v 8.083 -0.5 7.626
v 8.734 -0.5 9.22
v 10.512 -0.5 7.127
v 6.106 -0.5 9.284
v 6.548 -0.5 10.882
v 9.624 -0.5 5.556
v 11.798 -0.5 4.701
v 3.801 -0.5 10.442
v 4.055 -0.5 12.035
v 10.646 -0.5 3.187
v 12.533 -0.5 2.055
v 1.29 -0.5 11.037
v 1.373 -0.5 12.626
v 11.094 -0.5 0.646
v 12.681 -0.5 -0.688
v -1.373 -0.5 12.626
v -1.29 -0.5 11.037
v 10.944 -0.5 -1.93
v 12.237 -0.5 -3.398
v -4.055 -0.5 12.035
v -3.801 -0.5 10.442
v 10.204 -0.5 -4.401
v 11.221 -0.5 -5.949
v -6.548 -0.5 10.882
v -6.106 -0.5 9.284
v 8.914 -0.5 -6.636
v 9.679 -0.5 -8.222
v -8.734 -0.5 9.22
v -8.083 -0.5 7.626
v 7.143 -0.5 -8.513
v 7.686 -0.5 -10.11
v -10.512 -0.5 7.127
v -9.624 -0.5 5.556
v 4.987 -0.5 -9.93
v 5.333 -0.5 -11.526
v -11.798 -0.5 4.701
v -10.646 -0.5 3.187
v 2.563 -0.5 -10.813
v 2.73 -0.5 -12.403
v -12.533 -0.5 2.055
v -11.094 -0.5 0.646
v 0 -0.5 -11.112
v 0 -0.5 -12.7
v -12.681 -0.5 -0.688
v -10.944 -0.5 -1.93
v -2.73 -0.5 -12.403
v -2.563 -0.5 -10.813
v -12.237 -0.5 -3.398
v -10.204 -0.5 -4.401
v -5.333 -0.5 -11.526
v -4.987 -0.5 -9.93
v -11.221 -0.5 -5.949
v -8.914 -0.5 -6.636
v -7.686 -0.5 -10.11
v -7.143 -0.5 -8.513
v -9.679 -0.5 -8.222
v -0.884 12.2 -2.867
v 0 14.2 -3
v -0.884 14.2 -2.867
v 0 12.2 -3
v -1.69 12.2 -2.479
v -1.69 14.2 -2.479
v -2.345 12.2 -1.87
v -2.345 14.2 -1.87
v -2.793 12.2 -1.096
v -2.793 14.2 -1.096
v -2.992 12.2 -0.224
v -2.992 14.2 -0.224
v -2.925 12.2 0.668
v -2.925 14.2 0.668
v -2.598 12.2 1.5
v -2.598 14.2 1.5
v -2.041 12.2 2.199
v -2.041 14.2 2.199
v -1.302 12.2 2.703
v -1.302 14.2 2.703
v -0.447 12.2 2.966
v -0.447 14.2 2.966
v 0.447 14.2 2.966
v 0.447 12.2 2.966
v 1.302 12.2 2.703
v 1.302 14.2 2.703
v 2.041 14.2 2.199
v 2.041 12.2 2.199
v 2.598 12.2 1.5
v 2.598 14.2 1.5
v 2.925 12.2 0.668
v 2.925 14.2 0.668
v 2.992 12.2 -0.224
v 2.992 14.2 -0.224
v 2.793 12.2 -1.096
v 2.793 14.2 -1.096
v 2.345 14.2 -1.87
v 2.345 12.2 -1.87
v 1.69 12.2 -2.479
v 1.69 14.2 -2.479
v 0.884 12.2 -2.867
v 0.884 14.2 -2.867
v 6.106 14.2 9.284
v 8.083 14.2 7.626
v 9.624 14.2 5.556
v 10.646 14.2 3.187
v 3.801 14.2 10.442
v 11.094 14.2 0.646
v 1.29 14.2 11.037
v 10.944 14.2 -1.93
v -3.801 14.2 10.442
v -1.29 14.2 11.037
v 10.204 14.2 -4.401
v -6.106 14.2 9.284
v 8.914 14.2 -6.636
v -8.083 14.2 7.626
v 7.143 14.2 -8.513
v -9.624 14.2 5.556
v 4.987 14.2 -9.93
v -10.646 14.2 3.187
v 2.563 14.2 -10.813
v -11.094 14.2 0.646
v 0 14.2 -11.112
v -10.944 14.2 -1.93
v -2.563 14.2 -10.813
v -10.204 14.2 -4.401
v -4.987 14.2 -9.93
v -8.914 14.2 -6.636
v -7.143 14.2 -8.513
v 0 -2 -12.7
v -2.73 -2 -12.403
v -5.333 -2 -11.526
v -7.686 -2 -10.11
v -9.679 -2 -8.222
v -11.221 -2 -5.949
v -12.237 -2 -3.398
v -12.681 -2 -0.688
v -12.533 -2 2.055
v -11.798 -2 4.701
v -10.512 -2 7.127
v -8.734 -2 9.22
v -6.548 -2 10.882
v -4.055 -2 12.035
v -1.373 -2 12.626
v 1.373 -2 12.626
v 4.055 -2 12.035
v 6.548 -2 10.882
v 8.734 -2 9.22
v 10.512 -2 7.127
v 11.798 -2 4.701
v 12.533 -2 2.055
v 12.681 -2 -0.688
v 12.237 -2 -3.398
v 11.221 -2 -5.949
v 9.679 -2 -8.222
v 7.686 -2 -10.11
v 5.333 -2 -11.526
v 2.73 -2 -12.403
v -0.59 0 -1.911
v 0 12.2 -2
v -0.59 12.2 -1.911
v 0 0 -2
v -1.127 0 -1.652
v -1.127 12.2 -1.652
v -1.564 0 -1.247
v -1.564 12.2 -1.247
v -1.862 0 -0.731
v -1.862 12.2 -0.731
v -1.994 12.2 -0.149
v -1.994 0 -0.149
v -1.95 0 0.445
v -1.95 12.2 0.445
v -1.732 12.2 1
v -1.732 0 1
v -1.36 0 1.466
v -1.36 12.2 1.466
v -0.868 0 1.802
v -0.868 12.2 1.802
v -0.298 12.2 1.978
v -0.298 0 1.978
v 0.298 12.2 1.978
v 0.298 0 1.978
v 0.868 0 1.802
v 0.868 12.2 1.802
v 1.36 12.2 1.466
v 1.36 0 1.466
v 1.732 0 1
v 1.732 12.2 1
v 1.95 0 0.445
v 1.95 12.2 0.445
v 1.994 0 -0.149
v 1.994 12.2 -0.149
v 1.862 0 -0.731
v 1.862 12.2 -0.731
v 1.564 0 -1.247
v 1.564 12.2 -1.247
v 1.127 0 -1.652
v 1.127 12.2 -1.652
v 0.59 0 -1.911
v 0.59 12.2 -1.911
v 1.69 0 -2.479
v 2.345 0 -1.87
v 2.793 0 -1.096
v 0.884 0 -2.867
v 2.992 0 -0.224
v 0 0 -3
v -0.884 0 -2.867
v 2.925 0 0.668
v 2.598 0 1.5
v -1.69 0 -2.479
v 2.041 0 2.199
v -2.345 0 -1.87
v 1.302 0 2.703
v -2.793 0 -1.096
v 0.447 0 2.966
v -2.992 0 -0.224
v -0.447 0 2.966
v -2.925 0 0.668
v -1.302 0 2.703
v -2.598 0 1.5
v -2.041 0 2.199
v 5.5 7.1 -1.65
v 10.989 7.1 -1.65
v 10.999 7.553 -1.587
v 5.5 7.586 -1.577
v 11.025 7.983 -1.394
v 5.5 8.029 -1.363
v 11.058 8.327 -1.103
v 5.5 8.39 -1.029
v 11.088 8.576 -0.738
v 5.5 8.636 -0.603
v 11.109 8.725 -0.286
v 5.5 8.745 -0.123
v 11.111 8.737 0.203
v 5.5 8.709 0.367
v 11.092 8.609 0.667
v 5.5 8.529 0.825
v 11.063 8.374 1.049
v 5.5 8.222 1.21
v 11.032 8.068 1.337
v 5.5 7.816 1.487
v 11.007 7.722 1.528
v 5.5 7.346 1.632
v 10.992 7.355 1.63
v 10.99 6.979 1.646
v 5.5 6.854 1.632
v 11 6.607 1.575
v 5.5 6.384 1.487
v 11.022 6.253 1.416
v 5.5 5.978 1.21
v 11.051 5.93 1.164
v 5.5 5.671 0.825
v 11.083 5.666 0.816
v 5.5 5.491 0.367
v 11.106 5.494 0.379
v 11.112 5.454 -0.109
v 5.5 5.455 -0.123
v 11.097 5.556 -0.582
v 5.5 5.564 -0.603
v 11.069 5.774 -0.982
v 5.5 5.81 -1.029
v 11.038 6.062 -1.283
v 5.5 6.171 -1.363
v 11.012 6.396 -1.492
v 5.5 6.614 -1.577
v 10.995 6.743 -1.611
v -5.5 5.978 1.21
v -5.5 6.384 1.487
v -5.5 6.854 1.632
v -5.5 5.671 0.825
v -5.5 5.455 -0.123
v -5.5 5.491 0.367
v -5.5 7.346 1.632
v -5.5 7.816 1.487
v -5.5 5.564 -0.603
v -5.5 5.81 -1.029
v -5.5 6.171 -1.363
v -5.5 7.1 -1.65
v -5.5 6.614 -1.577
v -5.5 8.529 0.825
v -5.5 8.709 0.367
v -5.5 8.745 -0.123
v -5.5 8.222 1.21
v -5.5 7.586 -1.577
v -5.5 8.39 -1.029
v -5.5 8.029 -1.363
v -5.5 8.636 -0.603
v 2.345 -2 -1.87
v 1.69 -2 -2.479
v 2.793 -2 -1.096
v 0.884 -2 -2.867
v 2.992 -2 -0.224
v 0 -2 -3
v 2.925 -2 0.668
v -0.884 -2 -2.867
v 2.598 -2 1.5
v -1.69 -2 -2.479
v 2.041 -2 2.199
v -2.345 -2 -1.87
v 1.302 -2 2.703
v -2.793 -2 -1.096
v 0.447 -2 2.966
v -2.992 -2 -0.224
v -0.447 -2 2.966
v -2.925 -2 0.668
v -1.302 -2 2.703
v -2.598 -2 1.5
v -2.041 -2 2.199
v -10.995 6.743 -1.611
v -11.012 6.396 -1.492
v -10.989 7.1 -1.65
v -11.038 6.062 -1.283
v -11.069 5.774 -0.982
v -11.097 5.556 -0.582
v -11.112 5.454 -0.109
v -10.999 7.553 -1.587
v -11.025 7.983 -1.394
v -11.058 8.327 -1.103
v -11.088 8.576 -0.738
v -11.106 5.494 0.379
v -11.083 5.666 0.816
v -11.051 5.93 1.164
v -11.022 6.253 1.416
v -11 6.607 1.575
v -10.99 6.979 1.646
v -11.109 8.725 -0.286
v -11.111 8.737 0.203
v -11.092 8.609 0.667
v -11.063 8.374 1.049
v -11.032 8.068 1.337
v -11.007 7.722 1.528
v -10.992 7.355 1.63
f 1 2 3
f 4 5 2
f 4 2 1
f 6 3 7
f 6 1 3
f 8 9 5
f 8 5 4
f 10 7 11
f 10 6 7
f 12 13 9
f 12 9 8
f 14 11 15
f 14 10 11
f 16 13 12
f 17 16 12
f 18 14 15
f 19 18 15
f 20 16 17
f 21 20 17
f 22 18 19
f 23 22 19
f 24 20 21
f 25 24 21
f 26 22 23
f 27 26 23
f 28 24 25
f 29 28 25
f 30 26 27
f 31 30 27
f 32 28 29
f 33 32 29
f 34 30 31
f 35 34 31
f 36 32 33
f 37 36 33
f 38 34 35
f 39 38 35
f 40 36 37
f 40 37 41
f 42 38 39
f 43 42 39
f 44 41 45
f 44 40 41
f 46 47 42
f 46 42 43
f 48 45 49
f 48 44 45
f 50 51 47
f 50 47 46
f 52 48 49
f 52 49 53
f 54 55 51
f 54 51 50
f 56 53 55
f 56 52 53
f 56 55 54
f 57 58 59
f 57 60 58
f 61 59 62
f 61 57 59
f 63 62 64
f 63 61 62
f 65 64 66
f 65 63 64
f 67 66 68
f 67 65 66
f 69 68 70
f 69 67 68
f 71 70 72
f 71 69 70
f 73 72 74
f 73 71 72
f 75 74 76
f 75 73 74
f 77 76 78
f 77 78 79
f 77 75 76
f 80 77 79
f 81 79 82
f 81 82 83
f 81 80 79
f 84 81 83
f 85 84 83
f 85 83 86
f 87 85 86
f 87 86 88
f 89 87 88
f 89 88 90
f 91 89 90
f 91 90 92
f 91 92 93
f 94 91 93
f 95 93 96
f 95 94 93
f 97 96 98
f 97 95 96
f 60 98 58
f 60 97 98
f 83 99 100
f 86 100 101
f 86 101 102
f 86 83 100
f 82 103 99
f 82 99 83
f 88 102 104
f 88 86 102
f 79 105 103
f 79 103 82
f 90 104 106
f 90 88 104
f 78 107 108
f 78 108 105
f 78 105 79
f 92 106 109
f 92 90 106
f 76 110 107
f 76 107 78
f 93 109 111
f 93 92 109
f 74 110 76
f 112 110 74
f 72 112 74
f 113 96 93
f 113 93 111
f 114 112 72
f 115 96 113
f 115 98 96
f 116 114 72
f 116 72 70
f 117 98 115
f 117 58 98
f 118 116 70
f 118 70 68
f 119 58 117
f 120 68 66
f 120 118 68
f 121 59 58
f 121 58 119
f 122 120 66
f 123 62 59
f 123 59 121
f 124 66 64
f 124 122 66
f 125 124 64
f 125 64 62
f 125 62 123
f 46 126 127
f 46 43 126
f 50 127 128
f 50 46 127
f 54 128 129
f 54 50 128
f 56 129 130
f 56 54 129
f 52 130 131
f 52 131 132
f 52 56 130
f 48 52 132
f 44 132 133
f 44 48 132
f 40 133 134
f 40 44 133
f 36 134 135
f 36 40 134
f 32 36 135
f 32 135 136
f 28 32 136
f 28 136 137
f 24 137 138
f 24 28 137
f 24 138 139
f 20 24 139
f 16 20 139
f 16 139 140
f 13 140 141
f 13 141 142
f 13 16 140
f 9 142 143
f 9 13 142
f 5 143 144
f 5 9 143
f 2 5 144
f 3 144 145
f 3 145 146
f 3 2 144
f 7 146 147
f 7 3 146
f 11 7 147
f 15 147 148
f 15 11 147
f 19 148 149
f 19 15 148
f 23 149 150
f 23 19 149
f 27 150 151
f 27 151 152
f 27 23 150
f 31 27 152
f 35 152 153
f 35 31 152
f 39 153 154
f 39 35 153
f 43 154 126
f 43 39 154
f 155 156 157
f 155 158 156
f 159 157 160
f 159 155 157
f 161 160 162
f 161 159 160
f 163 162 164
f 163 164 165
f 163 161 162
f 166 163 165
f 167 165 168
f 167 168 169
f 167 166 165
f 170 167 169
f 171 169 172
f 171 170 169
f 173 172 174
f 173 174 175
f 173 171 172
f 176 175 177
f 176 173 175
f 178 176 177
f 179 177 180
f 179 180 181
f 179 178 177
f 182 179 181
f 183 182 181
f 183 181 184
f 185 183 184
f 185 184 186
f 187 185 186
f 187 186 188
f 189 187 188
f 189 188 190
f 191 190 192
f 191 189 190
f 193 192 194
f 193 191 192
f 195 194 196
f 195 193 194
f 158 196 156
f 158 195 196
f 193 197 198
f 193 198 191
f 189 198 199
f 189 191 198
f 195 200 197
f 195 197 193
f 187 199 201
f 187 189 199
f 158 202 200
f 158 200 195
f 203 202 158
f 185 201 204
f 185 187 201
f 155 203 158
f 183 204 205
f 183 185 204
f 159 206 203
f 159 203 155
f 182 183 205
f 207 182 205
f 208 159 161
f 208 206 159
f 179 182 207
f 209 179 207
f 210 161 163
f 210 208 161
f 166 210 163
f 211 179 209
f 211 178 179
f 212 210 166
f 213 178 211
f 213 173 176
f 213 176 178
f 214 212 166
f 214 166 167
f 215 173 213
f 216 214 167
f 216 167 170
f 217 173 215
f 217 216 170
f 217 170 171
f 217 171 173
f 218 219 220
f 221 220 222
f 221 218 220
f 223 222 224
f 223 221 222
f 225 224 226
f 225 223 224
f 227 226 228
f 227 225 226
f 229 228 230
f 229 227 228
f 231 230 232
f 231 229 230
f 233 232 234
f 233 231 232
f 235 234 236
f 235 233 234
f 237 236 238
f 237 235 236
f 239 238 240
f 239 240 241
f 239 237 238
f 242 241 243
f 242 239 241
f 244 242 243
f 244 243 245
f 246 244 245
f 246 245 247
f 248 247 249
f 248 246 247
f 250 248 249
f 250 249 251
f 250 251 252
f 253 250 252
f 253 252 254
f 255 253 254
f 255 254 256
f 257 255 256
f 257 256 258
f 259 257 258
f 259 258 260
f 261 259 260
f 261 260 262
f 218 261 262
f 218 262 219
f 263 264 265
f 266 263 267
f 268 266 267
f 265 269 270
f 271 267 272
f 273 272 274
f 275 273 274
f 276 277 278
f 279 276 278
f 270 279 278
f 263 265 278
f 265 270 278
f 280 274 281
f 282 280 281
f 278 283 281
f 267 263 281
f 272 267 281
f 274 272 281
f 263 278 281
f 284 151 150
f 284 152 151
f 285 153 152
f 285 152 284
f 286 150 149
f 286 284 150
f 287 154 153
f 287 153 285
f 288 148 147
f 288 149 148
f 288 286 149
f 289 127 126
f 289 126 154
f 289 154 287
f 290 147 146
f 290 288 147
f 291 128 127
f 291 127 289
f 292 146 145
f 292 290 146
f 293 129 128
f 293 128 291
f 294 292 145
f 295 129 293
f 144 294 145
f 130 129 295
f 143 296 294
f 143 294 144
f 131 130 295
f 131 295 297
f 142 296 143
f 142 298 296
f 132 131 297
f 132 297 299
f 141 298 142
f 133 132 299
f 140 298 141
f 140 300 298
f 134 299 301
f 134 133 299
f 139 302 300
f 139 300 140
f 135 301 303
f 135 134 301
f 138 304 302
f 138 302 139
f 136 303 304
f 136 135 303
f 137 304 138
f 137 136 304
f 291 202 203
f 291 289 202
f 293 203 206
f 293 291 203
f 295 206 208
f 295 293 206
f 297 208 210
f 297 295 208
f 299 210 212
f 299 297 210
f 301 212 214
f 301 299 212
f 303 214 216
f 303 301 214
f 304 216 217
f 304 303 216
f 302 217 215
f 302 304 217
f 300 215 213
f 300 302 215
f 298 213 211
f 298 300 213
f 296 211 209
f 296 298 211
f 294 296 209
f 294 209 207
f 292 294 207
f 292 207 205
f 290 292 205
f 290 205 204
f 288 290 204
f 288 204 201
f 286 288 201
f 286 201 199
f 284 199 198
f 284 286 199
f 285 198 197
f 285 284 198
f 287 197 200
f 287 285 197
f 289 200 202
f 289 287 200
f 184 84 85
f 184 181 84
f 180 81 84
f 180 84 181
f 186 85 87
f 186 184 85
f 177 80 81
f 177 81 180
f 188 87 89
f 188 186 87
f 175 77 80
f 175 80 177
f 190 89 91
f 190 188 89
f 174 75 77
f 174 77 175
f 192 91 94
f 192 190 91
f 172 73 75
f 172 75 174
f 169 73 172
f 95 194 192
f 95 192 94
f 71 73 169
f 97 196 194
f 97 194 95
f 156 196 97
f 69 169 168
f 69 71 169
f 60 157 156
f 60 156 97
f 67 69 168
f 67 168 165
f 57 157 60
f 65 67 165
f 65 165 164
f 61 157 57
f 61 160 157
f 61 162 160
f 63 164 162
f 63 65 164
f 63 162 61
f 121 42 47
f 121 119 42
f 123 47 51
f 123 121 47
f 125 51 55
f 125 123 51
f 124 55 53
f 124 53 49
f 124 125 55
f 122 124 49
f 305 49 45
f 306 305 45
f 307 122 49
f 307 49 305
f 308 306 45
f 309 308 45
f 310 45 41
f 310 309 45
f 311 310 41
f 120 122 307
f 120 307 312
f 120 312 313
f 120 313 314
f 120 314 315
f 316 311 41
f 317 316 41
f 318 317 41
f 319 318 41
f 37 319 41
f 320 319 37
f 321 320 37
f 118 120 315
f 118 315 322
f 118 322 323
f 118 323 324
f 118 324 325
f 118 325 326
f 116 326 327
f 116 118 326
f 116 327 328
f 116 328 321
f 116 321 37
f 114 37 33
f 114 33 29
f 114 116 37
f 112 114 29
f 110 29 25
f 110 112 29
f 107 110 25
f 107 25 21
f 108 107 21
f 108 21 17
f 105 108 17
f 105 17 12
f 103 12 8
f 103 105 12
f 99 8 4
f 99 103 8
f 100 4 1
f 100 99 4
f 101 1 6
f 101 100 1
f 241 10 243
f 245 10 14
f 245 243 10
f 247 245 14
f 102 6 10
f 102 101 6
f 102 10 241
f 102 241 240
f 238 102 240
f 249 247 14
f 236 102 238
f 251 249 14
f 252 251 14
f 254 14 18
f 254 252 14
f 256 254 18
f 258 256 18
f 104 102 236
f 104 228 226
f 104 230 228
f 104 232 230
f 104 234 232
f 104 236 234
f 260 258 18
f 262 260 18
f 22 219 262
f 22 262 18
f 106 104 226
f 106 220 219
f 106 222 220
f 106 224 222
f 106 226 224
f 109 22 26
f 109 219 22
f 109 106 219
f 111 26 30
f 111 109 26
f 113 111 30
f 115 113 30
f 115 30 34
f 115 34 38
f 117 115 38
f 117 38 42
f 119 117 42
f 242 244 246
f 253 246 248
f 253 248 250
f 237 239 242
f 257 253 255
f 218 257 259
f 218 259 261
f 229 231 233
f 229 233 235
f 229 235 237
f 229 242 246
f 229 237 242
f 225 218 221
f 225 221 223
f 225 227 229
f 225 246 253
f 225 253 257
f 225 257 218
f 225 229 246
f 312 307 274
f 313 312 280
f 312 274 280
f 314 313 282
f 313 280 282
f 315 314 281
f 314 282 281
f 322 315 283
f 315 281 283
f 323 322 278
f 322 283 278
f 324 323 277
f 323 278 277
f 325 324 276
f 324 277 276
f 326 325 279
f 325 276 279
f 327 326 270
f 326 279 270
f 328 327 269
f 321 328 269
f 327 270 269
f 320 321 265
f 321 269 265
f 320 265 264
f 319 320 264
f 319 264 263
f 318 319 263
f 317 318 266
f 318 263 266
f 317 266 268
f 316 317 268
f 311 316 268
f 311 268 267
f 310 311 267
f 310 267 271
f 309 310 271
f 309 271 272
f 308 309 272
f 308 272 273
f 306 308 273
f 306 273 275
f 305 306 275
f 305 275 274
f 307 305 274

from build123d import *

# Parameters (mm, degrees)
CUT_EXTRUDE1_REACH      = 30.396
CUT_EXTRUDE1_END_RADIUS = 11.1125
CUT_EXTRUDE1_START      = -5.5
SKETCH2_R               = 1.65


with BuildPart() as part:
    # Sketch1 → Revolve1 (revolve)
    with BuildSketch(Plane(origin=(0, 0, 0), x_dir=(0, 0, -1), z_dir=(1, 0, 0)), mode=Mode.PRIVATE) as revolve1_sk:
        Polygon((-2, 0), (-3, 0), (-3, -2), (-12.7, -2), (-12.7, -0.5), (-11.1125, -0.5), (-11.1125, 14.2), (-3, 14.2), (-3, 12.2), (-2, 12.2), align=None)
    revolve(revolve1_sk.sketch.rotate(Axis((0, -1000, 0), (0, 1, 0)), 180), axis=Axis((0, -1000, 0), (0, 1, 0)))

    # Cut-Extrude1: up to this cylinder (the profile starts inside it)
    cut_extrude1_end = Plane(origin=(0, 7.1, 0), z_dir=(0, -1, 0)) * Cylinder(CUT_EXTRUDE1_END_RADIUS, 84.017, mode=Mode.PRIVATE)
    # Sketch2 → Cut-Extrude1 (cut, up to the surface)
    with BuildSketch(Plane(origin=(0, 0, 0), x_dir=(0, 0, -1), z_dir=(1, 0, 0)).offset(CUT_EXTRUDE1_START), mode=Mode.PRIVATE) as cut_extrude1_sk1:
        with Locations((0, 7.1)):
            Circle(SKETCH2_R)
    cut_extrude1_tool1 = extrude(cut_extrude1_sk1.sketch, amount=-CUT_EXTRUDE1_REACH, mode=Mode.PRIVATE) & cut_extrude1_end
    cut_extrude1 = cut_extrude1_tool1.solids().sort_by_distance((-5.5, 7.1, 0))[0]
    add(cut_extrude1, mode=Mode.SUBTRACT)

    # Mirror1: Cut-Extrude1 across plane
    add(cut_extrude1.mirror(Plane(origin=(0, 0, 0), x_dir=(0, 0, 1), z_dir=(1, 0, 0))), mode=Mode.SUBTRACT)


solid = part.part
